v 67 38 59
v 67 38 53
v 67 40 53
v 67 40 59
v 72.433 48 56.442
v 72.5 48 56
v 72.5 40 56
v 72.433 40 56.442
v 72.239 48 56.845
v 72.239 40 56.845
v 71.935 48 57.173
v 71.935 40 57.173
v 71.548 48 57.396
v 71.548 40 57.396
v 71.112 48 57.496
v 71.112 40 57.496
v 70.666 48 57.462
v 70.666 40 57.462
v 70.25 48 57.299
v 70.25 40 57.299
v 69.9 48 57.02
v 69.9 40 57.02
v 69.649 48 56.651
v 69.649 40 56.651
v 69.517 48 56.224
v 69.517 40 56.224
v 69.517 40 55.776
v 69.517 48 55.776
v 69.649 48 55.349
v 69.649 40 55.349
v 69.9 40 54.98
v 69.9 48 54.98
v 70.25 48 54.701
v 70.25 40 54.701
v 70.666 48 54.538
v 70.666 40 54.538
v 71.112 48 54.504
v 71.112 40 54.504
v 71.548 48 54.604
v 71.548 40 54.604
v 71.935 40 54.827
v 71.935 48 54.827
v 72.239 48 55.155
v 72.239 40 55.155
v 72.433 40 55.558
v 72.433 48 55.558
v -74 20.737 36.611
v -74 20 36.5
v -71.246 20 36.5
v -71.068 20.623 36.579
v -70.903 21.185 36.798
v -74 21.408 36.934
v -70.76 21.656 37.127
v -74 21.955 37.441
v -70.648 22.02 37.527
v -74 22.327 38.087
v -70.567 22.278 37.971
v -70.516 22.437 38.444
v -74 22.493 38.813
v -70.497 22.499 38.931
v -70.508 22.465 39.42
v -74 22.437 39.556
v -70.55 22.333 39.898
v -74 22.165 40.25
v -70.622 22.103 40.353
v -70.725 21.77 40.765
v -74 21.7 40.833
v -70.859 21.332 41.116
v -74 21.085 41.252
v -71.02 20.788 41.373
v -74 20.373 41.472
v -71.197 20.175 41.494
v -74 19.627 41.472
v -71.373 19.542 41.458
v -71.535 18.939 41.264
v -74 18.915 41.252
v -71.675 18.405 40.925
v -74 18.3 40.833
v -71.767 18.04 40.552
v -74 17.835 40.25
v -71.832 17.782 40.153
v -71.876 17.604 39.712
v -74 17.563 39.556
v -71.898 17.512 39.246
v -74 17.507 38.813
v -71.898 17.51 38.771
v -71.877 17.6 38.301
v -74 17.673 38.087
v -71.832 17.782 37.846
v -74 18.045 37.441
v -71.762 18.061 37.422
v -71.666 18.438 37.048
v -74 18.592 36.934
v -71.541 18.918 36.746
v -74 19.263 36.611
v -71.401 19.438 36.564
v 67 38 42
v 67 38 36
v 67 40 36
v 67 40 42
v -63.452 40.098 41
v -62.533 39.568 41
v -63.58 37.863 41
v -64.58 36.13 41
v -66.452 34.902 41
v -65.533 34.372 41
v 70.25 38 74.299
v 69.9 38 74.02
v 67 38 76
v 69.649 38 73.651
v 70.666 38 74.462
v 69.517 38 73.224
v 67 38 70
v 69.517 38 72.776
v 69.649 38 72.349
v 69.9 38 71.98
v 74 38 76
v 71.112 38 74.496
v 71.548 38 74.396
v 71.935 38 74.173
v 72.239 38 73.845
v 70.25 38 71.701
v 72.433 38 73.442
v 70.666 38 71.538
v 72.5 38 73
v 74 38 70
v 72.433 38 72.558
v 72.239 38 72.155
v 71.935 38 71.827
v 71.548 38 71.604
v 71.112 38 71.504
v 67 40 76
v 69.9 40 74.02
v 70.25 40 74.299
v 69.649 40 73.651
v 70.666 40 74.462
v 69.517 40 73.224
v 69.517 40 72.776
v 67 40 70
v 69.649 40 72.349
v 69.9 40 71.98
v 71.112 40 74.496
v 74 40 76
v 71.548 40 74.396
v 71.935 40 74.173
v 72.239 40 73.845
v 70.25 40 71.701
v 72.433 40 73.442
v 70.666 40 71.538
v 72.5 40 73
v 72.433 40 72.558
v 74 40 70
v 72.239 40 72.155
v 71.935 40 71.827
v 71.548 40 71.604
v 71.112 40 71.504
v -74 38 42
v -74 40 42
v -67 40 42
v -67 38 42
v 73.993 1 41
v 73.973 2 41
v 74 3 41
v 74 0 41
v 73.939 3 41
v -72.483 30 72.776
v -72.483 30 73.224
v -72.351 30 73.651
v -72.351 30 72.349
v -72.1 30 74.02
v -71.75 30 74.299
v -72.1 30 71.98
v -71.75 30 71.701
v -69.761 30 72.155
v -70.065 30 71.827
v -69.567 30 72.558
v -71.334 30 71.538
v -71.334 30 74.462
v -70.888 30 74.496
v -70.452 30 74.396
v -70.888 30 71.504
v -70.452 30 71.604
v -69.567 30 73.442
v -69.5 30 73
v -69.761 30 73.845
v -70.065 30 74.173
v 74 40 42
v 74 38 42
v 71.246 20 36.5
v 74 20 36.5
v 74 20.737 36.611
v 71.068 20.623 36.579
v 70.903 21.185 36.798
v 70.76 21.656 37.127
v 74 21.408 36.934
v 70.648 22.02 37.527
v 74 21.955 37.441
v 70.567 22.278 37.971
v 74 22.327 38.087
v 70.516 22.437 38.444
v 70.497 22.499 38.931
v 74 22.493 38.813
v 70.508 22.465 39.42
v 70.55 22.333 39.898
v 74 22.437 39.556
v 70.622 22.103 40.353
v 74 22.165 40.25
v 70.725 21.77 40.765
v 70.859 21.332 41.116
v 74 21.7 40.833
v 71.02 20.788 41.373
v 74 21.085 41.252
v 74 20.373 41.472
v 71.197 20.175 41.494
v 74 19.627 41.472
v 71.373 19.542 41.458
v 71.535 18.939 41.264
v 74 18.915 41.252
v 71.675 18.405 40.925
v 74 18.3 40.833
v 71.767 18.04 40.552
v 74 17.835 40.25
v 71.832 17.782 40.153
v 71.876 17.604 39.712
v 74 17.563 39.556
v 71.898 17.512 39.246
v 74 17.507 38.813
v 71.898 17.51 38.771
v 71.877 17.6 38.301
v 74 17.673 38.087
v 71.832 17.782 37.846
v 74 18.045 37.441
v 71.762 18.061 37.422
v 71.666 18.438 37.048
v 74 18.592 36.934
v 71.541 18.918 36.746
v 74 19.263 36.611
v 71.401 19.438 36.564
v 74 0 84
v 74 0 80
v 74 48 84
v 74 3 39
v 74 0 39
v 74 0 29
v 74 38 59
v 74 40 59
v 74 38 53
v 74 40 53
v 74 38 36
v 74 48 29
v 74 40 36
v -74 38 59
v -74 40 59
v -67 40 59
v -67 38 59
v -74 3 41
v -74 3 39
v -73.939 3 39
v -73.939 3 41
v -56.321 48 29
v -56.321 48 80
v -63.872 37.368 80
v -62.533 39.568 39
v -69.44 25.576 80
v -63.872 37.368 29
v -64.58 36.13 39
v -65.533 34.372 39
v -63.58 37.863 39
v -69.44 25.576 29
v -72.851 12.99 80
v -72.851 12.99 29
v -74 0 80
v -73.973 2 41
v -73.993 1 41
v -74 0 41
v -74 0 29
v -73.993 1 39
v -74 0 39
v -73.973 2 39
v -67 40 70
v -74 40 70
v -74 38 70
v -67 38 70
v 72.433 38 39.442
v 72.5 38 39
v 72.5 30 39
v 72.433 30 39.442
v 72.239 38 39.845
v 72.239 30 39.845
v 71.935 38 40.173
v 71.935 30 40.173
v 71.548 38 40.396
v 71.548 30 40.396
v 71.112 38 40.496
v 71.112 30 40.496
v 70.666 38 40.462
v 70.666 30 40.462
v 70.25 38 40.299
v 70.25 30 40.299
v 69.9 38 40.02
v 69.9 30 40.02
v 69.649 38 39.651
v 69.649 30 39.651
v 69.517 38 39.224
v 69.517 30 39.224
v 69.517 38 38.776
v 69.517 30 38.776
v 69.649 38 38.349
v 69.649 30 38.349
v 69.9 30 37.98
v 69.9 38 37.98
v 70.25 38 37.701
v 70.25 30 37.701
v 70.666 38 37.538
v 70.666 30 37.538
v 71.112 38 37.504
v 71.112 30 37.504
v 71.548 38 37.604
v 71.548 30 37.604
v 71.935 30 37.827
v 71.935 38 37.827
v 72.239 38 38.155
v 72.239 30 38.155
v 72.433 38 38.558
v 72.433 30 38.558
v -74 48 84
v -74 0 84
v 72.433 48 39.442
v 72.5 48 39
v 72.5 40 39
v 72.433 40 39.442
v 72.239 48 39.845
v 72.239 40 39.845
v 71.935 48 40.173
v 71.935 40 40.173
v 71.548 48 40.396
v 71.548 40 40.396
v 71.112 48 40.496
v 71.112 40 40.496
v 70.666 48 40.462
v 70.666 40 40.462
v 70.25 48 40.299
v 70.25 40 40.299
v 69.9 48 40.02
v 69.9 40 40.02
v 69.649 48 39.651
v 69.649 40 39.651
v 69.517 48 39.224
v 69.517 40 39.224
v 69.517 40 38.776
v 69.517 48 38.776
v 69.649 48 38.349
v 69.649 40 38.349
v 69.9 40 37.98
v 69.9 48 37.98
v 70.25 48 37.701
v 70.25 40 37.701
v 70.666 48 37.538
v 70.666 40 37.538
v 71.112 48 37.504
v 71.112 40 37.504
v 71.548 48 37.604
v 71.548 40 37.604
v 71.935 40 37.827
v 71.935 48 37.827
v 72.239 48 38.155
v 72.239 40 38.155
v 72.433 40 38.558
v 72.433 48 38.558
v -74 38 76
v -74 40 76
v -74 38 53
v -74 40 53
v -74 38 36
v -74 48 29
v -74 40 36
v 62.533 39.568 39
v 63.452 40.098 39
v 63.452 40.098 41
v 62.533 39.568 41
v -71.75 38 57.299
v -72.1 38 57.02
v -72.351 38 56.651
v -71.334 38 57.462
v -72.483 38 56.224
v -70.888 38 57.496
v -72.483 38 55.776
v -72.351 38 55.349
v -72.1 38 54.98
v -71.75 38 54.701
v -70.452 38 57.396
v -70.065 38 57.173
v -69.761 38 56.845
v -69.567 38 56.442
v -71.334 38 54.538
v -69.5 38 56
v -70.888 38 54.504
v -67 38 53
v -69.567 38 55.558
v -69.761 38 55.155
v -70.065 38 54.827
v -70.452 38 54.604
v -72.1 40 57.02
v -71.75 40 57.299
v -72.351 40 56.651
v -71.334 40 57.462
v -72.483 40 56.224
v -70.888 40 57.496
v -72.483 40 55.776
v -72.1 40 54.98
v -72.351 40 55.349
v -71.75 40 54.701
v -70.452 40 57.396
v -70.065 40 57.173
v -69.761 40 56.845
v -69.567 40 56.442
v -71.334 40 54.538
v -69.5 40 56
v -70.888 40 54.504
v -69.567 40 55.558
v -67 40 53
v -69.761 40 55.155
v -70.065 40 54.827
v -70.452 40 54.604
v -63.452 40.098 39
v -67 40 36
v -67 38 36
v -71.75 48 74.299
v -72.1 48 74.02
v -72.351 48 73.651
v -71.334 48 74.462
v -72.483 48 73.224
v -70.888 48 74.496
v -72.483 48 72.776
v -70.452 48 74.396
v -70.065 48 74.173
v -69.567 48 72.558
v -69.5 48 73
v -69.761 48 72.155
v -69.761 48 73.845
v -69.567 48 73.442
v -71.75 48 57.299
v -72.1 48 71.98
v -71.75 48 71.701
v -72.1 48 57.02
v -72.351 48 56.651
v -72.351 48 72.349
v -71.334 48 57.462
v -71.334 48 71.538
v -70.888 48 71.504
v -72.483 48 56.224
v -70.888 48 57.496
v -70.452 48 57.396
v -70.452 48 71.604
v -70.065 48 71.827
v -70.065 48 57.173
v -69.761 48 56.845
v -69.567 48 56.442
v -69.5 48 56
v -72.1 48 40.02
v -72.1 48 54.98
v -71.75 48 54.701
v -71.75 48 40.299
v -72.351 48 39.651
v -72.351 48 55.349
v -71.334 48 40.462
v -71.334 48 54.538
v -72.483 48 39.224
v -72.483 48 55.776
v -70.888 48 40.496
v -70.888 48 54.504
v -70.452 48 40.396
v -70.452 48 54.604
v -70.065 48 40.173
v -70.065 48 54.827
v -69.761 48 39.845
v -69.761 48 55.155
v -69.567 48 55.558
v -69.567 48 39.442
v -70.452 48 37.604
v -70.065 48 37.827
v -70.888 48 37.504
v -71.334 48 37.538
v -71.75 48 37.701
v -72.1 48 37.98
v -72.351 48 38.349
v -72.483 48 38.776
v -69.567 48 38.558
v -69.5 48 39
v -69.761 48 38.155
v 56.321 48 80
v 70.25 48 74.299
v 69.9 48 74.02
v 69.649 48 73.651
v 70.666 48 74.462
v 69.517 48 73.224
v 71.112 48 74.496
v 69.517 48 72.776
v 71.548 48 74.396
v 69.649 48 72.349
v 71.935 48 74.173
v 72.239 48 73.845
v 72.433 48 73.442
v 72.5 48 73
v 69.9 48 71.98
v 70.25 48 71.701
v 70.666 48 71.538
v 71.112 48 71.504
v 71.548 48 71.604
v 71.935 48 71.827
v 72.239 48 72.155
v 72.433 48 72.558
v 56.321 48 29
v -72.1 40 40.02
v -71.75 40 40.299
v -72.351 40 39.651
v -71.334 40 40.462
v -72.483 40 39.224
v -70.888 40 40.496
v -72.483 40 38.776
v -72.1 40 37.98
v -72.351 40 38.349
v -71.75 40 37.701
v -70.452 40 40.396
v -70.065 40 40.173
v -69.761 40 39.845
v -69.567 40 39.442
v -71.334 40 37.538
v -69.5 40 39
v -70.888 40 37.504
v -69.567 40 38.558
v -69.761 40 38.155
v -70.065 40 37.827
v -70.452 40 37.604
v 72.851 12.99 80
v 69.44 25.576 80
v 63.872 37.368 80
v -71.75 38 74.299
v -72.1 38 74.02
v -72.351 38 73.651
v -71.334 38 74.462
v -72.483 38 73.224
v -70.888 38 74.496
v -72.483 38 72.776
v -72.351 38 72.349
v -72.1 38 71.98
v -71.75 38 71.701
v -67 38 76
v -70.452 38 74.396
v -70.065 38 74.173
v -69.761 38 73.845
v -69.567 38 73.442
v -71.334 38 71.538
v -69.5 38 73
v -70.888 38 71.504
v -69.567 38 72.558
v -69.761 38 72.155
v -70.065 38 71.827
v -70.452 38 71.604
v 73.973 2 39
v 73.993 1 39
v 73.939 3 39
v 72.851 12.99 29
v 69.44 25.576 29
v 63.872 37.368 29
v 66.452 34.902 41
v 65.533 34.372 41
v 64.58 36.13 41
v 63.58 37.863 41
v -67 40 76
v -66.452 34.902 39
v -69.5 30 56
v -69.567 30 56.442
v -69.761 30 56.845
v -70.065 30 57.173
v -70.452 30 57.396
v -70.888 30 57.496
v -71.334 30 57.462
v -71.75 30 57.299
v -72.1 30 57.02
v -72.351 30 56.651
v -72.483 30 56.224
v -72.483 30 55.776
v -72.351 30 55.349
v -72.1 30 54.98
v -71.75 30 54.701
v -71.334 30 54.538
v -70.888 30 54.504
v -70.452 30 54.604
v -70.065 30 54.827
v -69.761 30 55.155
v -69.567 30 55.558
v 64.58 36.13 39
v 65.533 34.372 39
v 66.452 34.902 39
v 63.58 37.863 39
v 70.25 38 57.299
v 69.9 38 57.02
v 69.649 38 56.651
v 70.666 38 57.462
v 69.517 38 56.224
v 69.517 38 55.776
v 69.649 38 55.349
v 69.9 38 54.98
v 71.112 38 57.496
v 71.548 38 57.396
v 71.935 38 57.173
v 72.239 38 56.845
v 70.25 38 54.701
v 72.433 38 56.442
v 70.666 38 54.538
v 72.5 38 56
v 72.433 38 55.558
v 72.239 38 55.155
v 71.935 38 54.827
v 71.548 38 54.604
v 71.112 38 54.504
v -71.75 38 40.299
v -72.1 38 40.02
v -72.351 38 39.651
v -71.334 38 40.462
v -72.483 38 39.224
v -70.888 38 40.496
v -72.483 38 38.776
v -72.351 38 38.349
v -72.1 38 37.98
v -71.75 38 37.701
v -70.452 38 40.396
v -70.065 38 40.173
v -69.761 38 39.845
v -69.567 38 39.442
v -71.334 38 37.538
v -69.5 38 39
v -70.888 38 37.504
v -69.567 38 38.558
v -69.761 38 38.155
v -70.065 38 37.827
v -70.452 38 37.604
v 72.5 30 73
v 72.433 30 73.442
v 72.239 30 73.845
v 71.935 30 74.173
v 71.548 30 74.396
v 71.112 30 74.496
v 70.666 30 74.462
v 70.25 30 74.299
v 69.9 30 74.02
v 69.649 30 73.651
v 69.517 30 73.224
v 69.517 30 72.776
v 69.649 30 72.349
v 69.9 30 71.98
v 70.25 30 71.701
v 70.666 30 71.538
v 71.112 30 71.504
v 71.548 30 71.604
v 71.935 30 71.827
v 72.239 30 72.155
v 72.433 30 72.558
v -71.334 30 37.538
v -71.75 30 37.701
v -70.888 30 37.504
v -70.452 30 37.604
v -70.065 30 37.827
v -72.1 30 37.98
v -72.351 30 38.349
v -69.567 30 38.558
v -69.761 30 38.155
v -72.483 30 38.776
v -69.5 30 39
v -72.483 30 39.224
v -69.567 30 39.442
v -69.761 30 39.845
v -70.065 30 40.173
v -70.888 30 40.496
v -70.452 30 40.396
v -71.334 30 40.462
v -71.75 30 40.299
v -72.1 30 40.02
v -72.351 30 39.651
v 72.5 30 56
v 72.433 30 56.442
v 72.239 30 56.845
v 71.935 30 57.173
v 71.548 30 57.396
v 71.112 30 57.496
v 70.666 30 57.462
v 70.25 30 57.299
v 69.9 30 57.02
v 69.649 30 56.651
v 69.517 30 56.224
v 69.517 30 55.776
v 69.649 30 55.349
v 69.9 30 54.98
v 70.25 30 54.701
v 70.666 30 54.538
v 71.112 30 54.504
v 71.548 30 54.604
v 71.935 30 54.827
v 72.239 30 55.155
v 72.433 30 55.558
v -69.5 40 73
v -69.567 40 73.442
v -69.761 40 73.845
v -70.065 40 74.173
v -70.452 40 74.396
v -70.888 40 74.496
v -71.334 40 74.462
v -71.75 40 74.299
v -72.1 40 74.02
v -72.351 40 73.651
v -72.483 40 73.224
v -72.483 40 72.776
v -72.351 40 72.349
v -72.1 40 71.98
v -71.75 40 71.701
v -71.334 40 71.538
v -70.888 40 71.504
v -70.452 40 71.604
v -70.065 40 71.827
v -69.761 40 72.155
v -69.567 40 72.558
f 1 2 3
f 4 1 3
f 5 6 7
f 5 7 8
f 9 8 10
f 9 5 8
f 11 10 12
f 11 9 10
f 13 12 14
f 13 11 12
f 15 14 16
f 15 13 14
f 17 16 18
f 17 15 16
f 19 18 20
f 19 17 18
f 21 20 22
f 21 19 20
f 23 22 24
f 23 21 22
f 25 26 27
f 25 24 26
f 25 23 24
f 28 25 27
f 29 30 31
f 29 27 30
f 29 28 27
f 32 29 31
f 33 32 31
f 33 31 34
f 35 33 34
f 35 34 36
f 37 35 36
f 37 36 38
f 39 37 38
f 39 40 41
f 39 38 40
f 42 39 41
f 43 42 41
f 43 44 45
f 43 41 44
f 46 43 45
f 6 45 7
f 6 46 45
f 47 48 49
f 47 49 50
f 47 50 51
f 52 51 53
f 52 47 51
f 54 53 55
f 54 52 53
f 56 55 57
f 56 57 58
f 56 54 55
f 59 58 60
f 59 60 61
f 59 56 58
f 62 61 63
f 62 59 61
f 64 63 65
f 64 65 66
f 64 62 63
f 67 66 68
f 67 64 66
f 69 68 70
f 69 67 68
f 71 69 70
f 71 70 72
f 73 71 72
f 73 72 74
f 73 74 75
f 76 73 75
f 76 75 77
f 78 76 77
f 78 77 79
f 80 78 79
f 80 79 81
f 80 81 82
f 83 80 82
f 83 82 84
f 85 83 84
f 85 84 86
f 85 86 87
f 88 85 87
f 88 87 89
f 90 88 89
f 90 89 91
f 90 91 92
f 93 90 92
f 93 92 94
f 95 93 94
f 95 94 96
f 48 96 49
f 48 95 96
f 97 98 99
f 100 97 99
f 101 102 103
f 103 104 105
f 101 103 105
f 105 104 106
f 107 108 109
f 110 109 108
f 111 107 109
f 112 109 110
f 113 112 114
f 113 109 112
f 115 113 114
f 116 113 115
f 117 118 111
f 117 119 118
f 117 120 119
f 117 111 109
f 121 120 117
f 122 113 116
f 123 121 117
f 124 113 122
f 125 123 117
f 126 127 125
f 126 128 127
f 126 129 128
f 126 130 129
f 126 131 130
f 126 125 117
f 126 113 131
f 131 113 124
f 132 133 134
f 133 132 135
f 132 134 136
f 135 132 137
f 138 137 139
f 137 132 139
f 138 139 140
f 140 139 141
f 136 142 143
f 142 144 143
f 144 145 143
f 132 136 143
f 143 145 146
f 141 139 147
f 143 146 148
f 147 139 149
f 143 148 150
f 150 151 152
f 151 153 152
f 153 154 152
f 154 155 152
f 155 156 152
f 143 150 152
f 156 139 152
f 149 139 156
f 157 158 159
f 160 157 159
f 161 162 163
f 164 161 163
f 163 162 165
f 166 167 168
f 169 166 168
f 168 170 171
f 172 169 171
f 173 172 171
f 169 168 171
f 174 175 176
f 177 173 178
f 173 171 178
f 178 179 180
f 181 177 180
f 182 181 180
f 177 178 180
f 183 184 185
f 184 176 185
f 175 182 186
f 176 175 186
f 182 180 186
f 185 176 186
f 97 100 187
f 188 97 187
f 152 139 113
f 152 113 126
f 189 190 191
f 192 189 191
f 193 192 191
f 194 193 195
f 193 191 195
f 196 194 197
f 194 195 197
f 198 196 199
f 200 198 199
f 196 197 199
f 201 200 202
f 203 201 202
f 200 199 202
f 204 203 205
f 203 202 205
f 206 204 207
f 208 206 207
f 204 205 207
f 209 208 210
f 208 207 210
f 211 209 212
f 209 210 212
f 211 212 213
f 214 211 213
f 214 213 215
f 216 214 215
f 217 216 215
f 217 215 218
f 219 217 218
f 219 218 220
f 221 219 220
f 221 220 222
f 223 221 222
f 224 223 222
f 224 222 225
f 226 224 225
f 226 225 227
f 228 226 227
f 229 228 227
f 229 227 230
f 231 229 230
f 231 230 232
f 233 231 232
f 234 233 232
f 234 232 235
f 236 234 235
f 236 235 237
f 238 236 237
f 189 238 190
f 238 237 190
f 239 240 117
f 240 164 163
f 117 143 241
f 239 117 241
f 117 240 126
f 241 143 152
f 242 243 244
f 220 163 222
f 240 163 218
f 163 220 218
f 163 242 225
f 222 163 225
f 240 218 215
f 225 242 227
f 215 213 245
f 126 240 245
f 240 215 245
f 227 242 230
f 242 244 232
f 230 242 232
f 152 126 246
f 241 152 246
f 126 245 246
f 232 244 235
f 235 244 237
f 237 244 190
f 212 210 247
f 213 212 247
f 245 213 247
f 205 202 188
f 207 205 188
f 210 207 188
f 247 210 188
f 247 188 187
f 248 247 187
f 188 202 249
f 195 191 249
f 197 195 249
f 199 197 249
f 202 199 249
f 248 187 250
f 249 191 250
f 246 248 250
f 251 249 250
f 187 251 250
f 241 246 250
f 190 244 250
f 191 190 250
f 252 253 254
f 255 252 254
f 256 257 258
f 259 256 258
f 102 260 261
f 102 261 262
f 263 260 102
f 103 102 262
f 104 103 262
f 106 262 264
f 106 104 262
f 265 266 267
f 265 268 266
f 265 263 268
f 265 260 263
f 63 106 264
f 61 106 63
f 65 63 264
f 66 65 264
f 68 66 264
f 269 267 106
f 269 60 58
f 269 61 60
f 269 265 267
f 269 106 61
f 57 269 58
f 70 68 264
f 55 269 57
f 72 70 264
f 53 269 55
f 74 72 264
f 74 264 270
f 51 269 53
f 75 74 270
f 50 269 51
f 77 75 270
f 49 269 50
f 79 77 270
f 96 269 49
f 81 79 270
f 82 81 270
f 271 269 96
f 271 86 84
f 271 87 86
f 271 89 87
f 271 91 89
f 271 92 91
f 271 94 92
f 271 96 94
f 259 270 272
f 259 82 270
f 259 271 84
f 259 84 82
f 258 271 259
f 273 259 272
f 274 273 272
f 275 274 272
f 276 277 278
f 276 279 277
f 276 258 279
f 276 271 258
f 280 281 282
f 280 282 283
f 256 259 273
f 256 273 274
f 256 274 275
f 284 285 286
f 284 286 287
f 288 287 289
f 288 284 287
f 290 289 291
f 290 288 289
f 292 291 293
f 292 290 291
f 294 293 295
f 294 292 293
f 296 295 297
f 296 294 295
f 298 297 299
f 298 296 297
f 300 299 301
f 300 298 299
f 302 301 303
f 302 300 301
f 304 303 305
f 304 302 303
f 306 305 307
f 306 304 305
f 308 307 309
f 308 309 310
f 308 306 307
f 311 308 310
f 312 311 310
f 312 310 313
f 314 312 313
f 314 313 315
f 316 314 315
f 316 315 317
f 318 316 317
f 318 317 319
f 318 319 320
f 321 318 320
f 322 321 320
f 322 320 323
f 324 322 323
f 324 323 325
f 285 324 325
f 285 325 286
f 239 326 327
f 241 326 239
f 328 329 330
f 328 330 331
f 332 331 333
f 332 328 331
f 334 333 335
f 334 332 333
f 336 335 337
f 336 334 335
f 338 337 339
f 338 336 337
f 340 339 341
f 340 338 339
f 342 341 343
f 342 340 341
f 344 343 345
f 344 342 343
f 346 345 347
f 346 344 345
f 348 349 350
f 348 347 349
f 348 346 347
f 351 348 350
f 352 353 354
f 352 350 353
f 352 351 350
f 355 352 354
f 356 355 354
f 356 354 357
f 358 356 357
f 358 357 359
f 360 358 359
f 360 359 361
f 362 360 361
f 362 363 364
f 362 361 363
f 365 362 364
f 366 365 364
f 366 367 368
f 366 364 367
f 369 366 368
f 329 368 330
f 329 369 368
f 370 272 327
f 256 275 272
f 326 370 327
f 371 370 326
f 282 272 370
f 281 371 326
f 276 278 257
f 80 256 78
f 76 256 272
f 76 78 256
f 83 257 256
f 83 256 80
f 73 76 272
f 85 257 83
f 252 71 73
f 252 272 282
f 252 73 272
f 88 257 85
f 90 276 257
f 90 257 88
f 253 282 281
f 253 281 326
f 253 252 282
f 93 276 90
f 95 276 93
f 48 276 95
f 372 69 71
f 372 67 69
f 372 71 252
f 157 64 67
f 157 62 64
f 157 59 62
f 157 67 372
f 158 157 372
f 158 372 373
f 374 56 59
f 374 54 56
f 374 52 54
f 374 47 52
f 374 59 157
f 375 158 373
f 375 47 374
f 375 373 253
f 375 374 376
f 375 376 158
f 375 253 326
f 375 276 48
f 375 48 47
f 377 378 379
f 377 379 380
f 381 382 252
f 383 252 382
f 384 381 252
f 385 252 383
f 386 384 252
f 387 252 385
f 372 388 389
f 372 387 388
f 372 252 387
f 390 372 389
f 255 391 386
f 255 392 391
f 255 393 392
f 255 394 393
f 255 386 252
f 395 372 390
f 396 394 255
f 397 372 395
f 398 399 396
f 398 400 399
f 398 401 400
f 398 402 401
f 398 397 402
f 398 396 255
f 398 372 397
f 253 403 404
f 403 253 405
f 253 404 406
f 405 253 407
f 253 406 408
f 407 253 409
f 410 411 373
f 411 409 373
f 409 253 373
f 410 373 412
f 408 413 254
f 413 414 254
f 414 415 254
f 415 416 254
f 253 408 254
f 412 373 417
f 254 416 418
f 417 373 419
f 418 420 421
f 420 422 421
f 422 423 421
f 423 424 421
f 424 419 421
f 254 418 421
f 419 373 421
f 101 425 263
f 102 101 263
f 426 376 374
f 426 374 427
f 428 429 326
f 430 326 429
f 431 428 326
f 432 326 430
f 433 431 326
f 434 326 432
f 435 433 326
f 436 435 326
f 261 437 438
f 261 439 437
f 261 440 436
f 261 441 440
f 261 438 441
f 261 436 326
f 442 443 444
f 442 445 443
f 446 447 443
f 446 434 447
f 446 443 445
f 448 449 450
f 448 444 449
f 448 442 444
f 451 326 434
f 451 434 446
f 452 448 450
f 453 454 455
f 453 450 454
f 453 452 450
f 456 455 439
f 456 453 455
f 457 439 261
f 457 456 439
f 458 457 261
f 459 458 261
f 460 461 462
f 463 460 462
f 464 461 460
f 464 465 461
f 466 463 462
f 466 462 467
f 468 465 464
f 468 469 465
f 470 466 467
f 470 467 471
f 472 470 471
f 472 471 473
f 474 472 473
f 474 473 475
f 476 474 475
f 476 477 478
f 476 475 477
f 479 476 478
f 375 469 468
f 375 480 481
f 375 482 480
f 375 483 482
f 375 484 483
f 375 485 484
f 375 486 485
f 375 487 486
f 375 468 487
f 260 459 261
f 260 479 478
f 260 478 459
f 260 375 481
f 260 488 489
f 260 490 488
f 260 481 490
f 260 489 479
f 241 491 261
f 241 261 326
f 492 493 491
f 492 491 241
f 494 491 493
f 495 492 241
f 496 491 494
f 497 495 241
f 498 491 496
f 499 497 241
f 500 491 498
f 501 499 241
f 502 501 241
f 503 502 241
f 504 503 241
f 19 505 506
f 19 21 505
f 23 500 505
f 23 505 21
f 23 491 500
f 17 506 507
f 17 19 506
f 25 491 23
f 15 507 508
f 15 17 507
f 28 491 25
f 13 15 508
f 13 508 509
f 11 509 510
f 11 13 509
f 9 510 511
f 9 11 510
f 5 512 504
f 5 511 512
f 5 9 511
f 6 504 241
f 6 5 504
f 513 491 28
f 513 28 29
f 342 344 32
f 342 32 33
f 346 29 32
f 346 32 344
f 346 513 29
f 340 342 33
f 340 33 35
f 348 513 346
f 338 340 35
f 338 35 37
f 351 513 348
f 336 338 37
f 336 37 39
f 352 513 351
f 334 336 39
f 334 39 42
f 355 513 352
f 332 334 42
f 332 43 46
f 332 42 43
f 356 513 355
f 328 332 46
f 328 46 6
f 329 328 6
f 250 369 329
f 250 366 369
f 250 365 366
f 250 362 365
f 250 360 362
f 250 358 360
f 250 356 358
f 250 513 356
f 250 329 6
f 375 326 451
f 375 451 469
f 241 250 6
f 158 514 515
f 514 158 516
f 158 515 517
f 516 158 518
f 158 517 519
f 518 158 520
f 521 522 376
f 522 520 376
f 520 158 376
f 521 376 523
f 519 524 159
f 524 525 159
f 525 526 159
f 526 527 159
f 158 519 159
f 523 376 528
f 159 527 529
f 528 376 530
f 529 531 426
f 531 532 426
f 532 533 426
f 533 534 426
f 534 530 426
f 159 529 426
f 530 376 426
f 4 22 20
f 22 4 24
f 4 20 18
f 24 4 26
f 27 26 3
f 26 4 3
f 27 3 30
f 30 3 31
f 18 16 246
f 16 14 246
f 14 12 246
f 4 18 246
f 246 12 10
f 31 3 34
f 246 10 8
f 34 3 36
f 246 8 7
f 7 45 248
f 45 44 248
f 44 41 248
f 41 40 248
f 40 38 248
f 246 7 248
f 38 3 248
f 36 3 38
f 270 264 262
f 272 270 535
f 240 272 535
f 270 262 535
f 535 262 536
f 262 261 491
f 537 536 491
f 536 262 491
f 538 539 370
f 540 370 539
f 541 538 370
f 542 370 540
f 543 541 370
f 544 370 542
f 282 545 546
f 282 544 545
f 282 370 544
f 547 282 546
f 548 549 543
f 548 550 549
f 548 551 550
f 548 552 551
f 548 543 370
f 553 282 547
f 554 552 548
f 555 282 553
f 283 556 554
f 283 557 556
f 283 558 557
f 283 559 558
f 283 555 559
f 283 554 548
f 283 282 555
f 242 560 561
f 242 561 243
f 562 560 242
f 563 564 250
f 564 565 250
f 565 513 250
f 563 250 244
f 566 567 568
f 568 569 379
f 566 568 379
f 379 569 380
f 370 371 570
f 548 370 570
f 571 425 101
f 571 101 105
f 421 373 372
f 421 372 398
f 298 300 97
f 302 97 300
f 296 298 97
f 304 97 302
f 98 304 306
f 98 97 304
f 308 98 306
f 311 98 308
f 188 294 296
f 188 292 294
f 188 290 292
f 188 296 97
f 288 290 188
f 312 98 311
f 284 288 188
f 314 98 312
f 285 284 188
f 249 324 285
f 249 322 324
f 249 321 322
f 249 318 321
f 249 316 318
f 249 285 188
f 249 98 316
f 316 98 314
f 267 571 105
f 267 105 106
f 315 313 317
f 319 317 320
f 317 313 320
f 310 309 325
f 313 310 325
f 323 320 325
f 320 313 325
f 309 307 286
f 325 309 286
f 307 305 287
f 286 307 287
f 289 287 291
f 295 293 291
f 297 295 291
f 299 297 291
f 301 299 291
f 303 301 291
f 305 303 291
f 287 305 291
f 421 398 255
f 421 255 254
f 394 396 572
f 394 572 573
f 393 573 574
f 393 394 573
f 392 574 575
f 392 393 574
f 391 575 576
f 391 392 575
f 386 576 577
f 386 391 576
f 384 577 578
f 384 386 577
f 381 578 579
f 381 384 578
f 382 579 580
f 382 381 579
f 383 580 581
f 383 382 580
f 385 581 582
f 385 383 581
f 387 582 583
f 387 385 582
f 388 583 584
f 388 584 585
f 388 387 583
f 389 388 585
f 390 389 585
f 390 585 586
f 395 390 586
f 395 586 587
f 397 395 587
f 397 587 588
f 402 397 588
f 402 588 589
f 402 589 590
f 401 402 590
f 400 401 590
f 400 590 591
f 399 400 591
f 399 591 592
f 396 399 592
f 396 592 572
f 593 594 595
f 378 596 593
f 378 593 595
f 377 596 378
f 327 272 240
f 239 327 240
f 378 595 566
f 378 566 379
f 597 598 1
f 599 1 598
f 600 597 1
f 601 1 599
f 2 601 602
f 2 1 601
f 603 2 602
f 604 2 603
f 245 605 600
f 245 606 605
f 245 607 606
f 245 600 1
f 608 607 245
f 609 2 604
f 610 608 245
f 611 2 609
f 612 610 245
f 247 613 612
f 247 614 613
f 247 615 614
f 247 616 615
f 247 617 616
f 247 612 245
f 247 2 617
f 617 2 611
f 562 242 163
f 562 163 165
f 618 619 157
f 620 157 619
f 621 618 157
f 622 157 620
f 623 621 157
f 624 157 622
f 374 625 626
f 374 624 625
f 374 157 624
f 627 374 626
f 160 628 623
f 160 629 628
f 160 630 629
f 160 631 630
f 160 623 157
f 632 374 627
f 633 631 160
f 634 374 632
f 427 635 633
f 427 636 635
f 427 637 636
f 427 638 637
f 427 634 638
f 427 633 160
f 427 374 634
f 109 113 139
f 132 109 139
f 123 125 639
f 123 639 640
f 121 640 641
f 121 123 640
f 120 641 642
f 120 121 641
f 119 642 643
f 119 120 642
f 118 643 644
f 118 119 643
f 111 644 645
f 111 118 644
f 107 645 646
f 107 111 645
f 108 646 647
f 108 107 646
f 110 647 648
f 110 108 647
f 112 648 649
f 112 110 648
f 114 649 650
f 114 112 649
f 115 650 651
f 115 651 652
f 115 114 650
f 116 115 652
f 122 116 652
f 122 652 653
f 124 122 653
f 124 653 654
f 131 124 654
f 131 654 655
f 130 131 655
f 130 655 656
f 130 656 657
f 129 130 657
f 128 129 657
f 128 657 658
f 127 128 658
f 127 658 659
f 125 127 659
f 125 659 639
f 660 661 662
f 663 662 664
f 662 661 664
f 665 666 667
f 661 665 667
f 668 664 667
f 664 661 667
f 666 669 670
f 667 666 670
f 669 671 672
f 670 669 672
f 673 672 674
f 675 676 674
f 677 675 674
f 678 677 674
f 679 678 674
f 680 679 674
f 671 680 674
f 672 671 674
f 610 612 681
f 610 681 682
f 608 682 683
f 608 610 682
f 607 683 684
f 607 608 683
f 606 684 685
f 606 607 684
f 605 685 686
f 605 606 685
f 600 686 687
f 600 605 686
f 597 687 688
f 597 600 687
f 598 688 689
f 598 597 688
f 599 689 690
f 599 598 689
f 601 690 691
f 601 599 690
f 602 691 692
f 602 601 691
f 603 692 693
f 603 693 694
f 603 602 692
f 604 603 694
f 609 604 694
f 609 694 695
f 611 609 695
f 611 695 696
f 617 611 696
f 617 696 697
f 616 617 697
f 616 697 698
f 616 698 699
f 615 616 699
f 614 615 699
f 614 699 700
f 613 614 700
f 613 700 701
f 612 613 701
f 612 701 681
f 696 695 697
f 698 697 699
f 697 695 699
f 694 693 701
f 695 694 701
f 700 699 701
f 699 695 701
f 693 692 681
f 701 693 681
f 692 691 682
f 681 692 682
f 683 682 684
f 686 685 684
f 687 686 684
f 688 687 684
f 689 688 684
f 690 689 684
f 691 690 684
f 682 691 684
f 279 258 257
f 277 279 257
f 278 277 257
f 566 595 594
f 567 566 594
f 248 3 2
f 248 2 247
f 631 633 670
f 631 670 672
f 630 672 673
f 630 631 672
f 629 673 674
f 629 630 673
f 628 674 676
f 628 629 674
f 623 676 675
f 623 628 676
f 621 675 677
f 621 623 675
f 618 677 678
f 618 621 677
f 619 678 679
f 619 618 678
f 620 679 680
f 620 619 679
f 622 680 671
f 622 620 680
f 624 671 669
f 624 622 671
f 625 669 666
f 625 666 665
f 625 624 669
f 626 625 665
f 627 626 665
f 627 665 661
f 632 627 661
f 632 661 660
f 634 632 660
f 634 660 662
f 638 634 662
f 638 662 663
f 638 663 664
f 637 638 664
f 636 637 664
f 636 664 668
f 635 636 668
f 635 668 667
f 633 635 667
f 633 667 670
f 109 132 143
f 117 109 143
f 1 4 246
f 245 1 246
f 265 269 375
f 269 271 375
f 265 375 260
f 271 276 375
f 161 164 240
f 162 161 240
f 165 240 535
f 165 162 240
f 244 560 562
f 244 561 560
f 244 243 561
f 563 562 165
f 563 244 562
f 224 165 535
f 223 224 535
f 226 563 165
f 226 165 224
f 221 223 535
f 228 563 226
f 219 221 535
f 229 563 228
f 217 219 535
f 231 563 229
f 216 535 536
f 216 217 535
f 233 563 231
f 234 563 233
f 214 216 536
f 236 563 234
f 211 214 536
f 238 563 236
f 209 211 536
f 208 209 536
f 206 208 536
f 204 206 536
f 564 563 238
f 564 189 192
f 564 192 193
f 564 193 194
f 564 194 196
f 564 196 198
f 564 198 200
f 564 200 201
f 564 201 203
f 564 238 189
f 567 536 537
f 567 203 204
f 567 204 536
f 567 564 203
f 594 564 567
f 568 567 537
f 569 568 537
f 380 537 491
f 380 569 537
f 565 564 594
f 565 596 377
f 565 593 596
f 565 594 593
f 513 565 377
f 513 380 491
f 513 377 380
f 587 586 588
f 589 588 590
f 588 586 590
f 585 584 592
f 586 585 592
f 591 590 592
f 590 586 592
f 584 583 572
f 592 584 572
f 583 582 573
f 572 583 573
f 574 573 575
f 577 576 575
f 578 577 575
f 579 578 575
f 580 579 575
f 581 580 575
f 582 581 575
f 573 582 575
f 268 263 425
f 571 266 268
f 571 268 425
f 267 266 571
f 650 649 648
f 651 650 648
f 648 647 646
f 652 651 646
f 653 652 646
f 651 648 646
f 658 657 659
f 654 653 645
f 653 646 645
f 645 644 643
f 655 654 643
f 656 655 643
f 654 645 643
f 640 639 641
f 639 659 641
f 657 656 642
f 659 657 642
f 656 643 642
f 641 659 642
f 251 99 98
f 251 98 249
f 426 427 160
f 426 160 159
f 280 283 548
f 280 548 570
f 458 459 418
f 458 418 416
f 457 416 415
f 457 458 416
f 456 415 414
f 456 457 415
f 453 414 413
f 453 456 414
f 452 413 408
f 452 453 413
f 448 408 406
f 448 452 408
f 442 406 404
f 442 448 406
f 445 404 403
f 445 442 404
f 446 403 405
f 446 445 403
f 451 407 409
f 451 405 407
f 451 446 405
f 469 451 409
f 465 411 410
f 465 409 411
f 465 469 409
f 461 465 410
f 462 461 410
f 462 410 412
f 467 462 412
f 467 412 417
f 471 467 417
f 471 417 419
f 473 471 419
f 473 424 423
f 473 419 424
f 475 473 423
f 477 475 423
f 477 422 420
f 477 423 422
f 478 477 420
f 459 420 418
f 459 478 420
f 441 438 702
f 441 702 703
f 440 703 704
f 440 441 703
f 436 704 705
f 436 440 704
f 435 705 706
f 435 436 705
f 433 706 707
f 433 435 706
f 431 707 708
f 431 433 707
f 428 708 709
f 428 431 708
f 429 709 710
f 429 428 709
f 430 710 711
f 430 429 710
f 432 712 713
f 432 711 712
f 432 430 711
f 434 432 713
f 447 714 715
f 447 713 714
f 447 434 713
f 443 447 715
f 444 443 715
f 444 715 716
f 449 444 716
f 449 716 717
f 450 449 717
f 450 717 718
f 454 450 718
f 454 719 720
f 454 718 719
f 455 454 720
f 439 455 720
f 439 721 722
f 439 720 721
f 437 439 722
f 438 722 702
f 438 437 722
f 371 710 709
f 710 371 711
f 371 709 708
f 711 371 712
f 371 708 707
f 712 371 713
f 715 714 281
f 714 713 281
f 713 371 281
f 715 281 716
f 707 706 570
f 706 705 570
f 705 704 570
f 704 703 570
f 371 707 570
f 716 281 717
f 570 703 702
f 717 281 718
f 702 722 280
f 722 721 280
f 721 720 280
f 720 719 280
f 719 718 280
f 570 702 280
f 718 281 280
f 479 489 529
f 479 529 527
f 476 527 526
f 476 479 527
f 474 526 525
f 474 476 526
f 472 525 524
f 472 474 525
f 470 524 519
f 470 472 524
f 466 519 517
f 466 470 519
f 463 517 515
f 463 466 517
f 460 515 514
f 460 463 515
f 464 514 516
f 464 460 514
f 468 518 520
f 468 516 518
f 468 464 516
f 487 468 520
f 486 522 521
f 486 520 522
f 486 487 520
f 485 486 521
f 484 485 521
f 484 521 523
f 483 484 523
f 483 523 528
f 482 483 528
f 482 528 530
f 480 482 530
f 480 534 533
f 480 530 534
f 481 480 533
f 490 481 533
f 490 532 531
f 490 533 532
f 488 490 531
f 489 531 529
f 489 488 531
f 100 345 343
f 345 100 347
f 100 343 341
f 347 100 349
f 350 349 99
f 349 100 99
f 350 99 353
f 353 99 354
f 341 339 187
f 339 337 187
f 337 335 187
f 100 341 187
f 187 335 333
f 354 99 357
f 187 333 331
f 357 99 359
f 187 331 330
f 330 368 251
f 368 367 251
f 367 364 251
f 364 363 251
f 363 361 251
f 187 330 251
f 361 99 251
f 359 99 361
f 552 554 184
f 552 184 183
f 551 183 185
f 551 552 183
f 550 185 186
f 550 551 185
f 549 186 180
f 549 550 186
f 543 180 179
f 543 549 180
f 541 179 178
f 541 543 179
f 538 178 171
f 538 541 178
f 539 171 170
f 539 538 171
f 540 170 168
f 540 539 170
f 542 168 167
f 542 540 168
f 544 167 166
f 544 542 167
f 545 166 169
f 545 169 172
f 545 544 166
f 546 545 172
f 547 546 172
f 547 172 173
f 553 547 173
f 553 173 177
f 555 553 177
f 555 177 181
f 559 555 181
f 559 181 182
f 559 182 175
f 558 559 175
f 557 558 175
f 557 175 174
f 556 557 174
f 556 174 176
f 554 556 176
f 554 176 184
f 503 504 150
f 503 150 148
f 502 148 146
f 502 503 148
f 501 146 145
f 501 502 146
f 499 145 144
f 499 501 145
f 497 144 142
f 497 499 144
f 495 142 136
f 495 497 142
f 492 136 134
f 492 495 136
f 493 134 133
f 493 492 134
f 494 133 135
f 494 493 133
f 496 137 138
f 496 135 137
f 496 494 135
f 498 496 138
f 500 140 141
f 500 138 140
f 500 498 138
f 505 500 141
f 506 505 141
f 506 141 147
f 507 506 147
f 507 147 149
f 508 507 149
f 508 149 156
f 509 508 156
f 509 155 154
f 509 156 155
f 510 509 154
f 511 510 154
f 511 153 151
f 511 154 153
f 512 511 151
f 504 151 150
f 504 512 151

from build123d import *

# Parameters (mm, degrees)
CYLINDER1844_R              = 2.5
CYLINDER1844_DEPTH          = 40
CYLINDER1841_R              = 2.5
CYLINDER1841_DEPTH          = 40
COMPOUND950_PLACEMENT_ANGLE = 90
CYLINDER1843_R              = 2.5
CYLINDER1843_DEPTH          = 40
CYLINDER1845_R              = 2.5
CYLINDER1845_DEPTH          = 40
COMPOUND949_PLACEMENT_ANGLE = 90
CYLINDER1842_R              = 2.5
CYLINDER1842_DEPTH          = 40
CYLINDER1850_R              = 2.5
CYLINDER1850_DEPTH          = 40
CYLINDER1851_R              = 2.5
CYLINDER1851_DEPTH          = 40
CYLINDER1848_R              = 2.5
CYLINDER1848_DEPTH          = 40
CYLINDER1846_R              = 2.5
CYLINDER1846_DEPTH          = 40
CYLINDER1847_R              = 2.5
CYLINDER1847_DEPTH          = 40
BOX851_W                    = 6
BOX851_H                    = 8
BOX851_DEPTH                = 2
BOX851_PLACEMENT_ANGLE      = 30
BOX852_W                    = 6
BOX852_H                    = 8
BOX852_DEPTH                = 2
BOX852_PLACEMENT_ANGLE      = 60
BOX853_W                    = 6
BOX853_H                    = 8
BOX853_DEPTH                = 2
BOX854_W                    = 6
BOX854_H                    = 8
BOX854_DEPTH                = 2
BOX854_PLACEMENT_ANGLE      = 120
BOX855_W                    = 6
BOX855_H                    = 8
BOX855_DEPTH                = 2
BOX855_PLACEMENT_ANGLE      = 150
BOX856_W                    = 6
BOX856_H                    = 8
BOX856_DEPTH                = 2
BOX857_W                    = 6
BOX857_H                    = 8
BOX857_DEPTH                = 2
BOX857_PLACEMENT_ANGLE      = 210
BOX858_W                    = 6
BOX858_H                    = 8
BOX858_DEPTH                = 2
BOX858_PLACEMENT_ANGLE      = 240
BOX859_W                    = 6
BOX859_H                    = 8
BOX859_DEPTH                = 2
BOX860_W                    = 6
BOX860_H                    = 8
BOX860_DEPTH                = 2
BOX860_PLACEMENT_ANGLE      = 60
BOX861_W                    = 6
BOX861_H                    = 8
BOX861_DEPTH                = 2
BOX861_PLACEMENT_ANGLE      = 30
BOX850_W                    = 6
BOX850_H                    = 8
BOX850_DEPTH                = 2
BOX814_W                    = 8
BOX814_H                    = 2
BOX814_DEPTH                = 6
BOX825_W                    = 8
BOX825_H                    = 2
BOX825_DEPTH                = 6
BOX847_W                    = 8
BOX847_H                    = 2
BOX847_DEPTH                = 6
BOX848_W                    = 8
BOX848_H                    = 2
BOX848_DEPTH                = 6
BOX849_W                    = 8
BOX849_H                    = 2
BOX849_DEPTH                = 6
BOX816_W                    = 8
BOX816_H                    = 2
BOX816_DEPTH                = 6
CYLINDER1862_R              = 1.5
CYLINDER1862_DEPTH          = 50
CYLINDER1865_R              = 1.5
CYLINDER1865_DEPTH          = 50
CYLINDER1863_R              = 1.5
CYLINDER1863_DEPTH          = 50
CYLINDER1861_R              = 1.5
CYLINDER1861_DEPTH          = 50
CYLINDER1858_R              = 1.5
CYLINDER1858_DEPTH          = 50
CYLINDER1859_R              = 1.5
CYLINDER1859_DEPTH          = 50
BOX815_W                    = 148
BOX815_H                    = 26
BOX815_DEPTH                = 55
CYLINDER1860_R              = 74
CYLINDER1860_DEPTH          = 51
BOX817_W                    = 148
BOX817_H                    = 74
BOX817_DEPTH                = 55


with BuildPart() as v_lec1844:
    # Cylinder1844 → Cylinder1844 (new body)
    with BuildSketch(Plane(origin=(-86, -10, 69), x_dir=(0, 0, -1), z_dir=(1, 0, 0))):
        Circle(CYLINDER1844_R)
    extrude(amount=CYLINDER1844_DEPTH)


with BuildPart() as compound950:
    # Cylinder1841 → Cylinder1841 (new body)
    with BuildSketch(Plane(origin=(-86, -10, 39), x_dir=(0, 0, -1), z_dir=(1, 0, 0))):
        Circle(CYLINDER1841_R)
    extrude(amount=CYLINDER1841_DEPTH)

    # Compound950: union Válec1844
    add(v_lec1844.part)


with BuildPart() as compound950_1:
    # Compound950 placement: moved
    add(compound950.part.moved(Location((-21.5, 0, 0))).rotate(Axis((-21.5, 0, 0), (0, 0, 1)), COMPOUND950_PLACEMENT_ANGLE))


with BuildPart() as v_lec1843:
    # Cylinder1843 → Cylinder1843 (new body)
    with BuildSketch(Plane(origin=(-86, -10, 69), x_dir=(0, 0, -1), z_dir=(1, 0, 0))):
        Circle(CYLINDER1843_R)
    extrude(amount=CYLINDER1843_DEPTH)


with BuildPart() as compound975:
    # Cylinder1845 → Cylinder1845 (new body)
    with BuildSketch(Plane(origin=(-86, -10, 39), x_dir=(0, 0, -1), z_dir=(1, 0, 0))):
        Circle(CYLINDER1845_R)
    extrude(amount=CYLINDER1845_DEPTH)

    # Compound949: union Válec1843
    add(v_lec1843.part)


with BuildPart() as compound975_1:
    # Compound949 placement: moved
    add(compound975.part.moved(Location((1.5, 0, 0))).rotate(Axis((1.5, 0, 0), (0, 0, 1)), COMPOUND949_PLACEMENT_ANGLE))

    # Compound975: union Compound950
    add(compound950_1.part)


with BuildPart() as v_lec1842:
    # Cylinder1842 → Cylinder1842 (new body)
    with BuildSketch(Plane(origin=(-86, 20, 39), x_dir=(0, 0, -1), z_dir=(1, 0, 0))):
        Circle(CYLINDER1842_R)
    extrude(amount=CYLINDER1842_DEPTH)


with BuildPart() as v_lec1850:
    # Cylinder1850 → Cylinder1850 (new body)
    with BuildSketch(Plane(origin=(-86, -10, 69), x_dir=(0, 0, -1), z_dir=(1, 0, 0))):
        Circle(CYLINDER1850_R)
    extrude(amount=CYLINDER1850_DEPTH)


with BuildPart() as compound974:
    # Cylinder1851 → Cylinder1851 (new body)
    with BuildSketch(Plane(origin=(-86, -10, 39), x_dir=(0, 0, -1), z_dir=(1, 0, 0))):
        Circle(CYLINDER1851_R)
    extrude(amount=CYLINDER1851_DEPTH)

    # Compound974: union Válec1842, Válec1850
    add(v_lec1842.part)
    add(v_lec1850.part)


with BuildPart() as mirror008:
    # mirror008: instance of Compound974
    add(compound974.part.mirror(Plane(origin=(0, 0, 0), x_dir=(0, -1, 0), z_dir=(1, 0, 0))))


with BuildPart() as v_lec1848:
    # Cylinder1848 → Cylinder1848 (new body)
    with BuildSketch(Plane(origin=(-86, 20, 39), x_dir=(0, 0, -1), z_dir=(1, 0, 0))):
        Circle(CYLINDER1848_R)
    extrude(amount=CYLINDER1848_DEPTH)


with BuildPart() as v_lec1846:
    # Cylinder1846 → Cylinder1846 (new body)
    with BuildSketch(Plane(origin=(-86, -10, 69), x_dir=(0, 0, -1), z_dir=(1, 0, 0))):
        Circle(CYLINDER1846_R)
    extrude(amount=CYLINDER1846_DEPTH)


with BuildPart() as compound948:
    # Cylinder1847 → Cylinder1847 (new body)
    with BuildSketch(Plane(origin=(-86, -10, 39), x_dir=(0, 0, -1), z_dir=(1, 0, 0))):
        Circle(CYLINDER1847_R)
    extrude(amount=CYLINDER1847_DEPTH)

    # Compound947: union Válec1848, Válec1846
    add(v_lec1848.part)
    add(v_lec1846.part)

    # Compound948: union Compound975, mirror008
    add(compound975_1.part)
    add(mirror008.part)


with BuildPart() as krychle851:
    # Box851 → Box851 (new body)
    with BuildSketch(Plane.XY):
        with Locations((3, 4)):
            Rectangle(BOX851_W, BOX851_H)
    extrude(amount=BOX851_DEPTH)


with BuildPart() as krychle851_1:
    # Box851 placement: moved
    add(krychle851.part.moved(Location((34.901924, -66.451905, 39))).rotate(Axis((34.901924, -66.451905, 39), (0, 0, 1)), BOX851_PLACEMENT_ANGLE))


with BuildPart() as krychle852:
    # Box852 → Box852 (new body)
    with BuildSketch(Plane.XY):
        with Locations((3, 4)):
            Rectangle(BOX852_W, BOX852_H)
    extrude(amount=BOX852_DEPTH)


with BuildPart() as krychle852_1:
    # Box852 placement: moved
    add(krychle852.part.moved(Location((63.451905, -40.098076, 39))).rotate(Axis((63.451905, -40.098076, 39), (0, 0, 1)), BOX852_PLACEMENT_ANGLE))


with BuildPart() as krychle853:
    # Box853 → Box853 (new body)
    with BuildSketch(Plane(origin=(75, -3, 39), x_dir=(0, 1, 0), z_dir=(0, 0, 1))):
        with Locations((3, 4)):
            Rectangle(BOX853_W, BOX853_H)
    extrude(amount=BOX853_DEPTH)


with BuildPart() as krychle854:
    # Box854 → Box854 (new body)
    with BuildSketch(Plane.XY):
        with Locations((3, 4)):
            Rectangle(BOX854_W, BOX854_H)
    extrude(amount=BOX854_DEPTH)


with BuildPart() as krychle854_1:
    # Box854 placement: moved
    add(krychle854.part.moved(Location((66.451905, 34.901924, 39))).rotate(Axis((66.451905, 34.901924, 39), (0, 0, 1)), BOX854_PLACEMENT_ANGLE))


with BuildPart() as krychle855:
    # Box855 → Box855 (new body)
    with BuildSketch(Plane.XY):
        with Locations((3, 4)):
            Rectangle(BOX855_W, BOX855_H)
    extrude(amount=BOX855_DEPTH)


with BuildPart() as krychle855_1:
    # Box855 placement: moved
    add(krychle855.part.moved(Location((40.098076, 63.451905, 39))).rotate(Axis((40.098076, 63.451905, 39), (0, 0, 1)), BOX855_PLACEMENT_ANGLE))


with BuildPart() as krychle856:
    # Box856 → Box856 (new body)
    with BuildSketch(Plane(origin=(3, 75, 39), x_dir=(-1, 0, 0), z_dir=(0, 0, 1))):
        with Locations((3, 4)):
            Rectangle(BOX856_W, BOX856_H)
    extrude(amount=BOX856_DEPTH)


with BuildPart() as krychle857:
    # Box857 → Box857 (new body)
    with BuildSketch(Plane.XY):
        with Locations((3, 4)):
            Rectangle(BOX857_W, BOX857_H)
    extrude(amount=BOX857_DEPTH)


with BuildPart() as krychle857_1:
    # Box857 placement: moved
    add(krychle857.part.moved(Location((-34.901924, 66.451905, 39))).rotate(Axis((-34.901924, 66.451905, 39), (0, 0, 1)), BOX857_PLACEMENT_ANGLE))


with BuildPart() as krychle858:
    # Box858 → Box858 (new body)
    with BuildSketch(Plane.XY):
        with Locations((3, 4)):
            Rectangle(BOX858_W, BOX858_H)
    extrude(amount=BOX858_DEPTH)


with BuildPart() as krychle858_1:
    # Box858 placement: moved
    add(krychle858.part.moved(Location((-63.451905, 40.098076, 39))).rotate(Axis((-63.451905, 40.098076, 39), (0, 0, 1)), BOX858_PLACEMENT_ANGLE))


with BuildPart() as krychle859:
    # Box859 → Box859 (new body)
    with BuildSketch(Plane(origin=(-75, 3, 39), x_dir=(0, -1, 0), z_dir=(0, 0, 1))):
        with Locations((3, 4)):
            Rectangle(BOX859_W, BOX859_H)
    extrude(amount=BOX859_DEPTH)


with BuildPart() as krychle860:
    # Box860 → Box860 (new body)
    with BuildSketch(Plane.XY):
        with Locations((3, 4)):
            Rectangle(BOX860_W, BOX860_H)
    extrude(amount=BOX860_DEPTH)


with BuildPart() as krychle860_1:
    # Box860 placement: moved
    add(krychle860.part.moved(Location((-66.451905, -34.901924, 39))).rotate(Axis((-66.451905, -34.901924, 39), (0, 0, -1)), BOX860_PLACEMENT_ANGLE))


with BuildPart() as krychle861:
    # Box861 → Box861 (new body)
    with BuildSketch(Plane.XY):
        with Locations((3, 4)):
            Rectangle(BOX861_W, BOX861_H)
    extrude(amount=BOX861_DEPTH)


with BuildPart() as krychle861_1:
    # Box861 placement: moved
    add(krychle861.part.moved(Location((-40.098076, -63.451905, 39))).rotate(Axis((-40.098076, -63.451905, 39), (0, 0, -1)), BOX861_PLACEMENT_ANGLE))


with BuildPart() as compound968:
    # Box850 → Box850 (new body)
    with BuildSketch(Plane(origin=(-3, -75, 39), x_dir=(1, 0, 0), z_dir=(0, 0, 1))):
        with Locations((3, 4)):
            Rectangle(BOX850_W, BOX850_H)
    extrude(amount=BOX850_DEPTH)

    # Compound968: union Krychle851, Krychle852, Krychle853, Krychle854, Krychle855, Krychle856, Krychle857, Krychle858, Krychle859, Krychle860, Krychle861
    add(krychle851_1.part)
    add(krychle852_1.part)
    add(krychle853.part)
    add(krychle854_1.part)
    add(krychle855_1.part)
    add(krychle856.part)
    add(krychle857_1.part)
    add(krychle858_1.part)
    add(krychle859.part)
    add(krychle860_1.part)
    add(krychle861_1.part)


with BuildPart() as krychle814:
    # Box814 → Box814 (new body)
    with BuildSketch(Plane(origin=(67, 38, 36), x_dir=(1, 0, 0), z_dir=(0, 0, 1))):
        with Locations((4, 1)):
            Rectangle(BOX814_W, BOX814_H)
    extrude(amount=BOX814_DEPTH)


with BuildPart() as krychle825:
    # Box825 → Box825 (new body)
    with BuildSketch(Plane(origin=(67, 38, 70), x_dir=(1, 0, 0), z_dir=(0, 0, 1))):
        with Locations((4, 1)):
            Rectangle(BOX825_W, BOX825_H)
    extrude(amount=BOX825_DEPTH)


with BuildPart() as krychle847:
    # Box847 → Box847 (new body)
    with BuildSketch(Plane(origin=(-75, 38, 70), x_dir=(1, 0, 0), z_dir=(0, 0, 1))):
        with Locations((4, 1)):
            Rectangle(BOX847_W, BOX847_H)
    extrude(amount=BOX847_DEPTH)


with BuildPart() as krychle848:
    # Box848 → Box848 (new body)
    with BuildSketch(Plane(origin=(-75, 38, 53), x_dir=(1, 0, 0), z_dir=(0, 0, 1))):
        with Locations((4, 1)):
            Rectangle(BOX848_W, BOX848_H)
    extrude(amount=BOX848_DEPTH)


with BuildPart() as krychle849:
    # Box849 → Box849 (new body)
    with BuildSketch(Plane(origin=(67, 38, 53), x_dir=(1, 0, 0), z_dir=(0, 0, 1))):
        with Locations((4, 1)):
            Rectangle(BOX849_W, BOX849_H)
    extrude(amount=BOX849_DEPTH)


with BuildPart() as compound970:
    # Box816 → Box816 (new body)
    with BuildSketch(Plane(origin=(-75, 38, 36), x_dir=(1, 0, 0), z_dir=(0, 0, 1))):
        with Locations((4, 1)):
            Rectangle(BOX816_W, BOX816_H)
    extrude(amount=BOX816_DEPTH)

    # Compound970: union Krychle814, Krychle825, Krychle847, Krychle848, Krychle849
    add(krychle814.part)
    add(krychle825.part)
    add(krychle847.part)
    add(krychle848.part)
    add(krychle849.part)


with BuildPart() as v_lec1862:
    # Cylinder1862 → Cylinder1862 (new body)
    with BuildSketch(Plane(origin=(71, 80, 39), x_dir=(1, 0, 0), z_dir=(0, -1, 0))):
        Circle(CYLINDER1862_R)
    extrude(amount=CYLINDER1862_DEPTH)


with BuildPart() as v_lec1865:
    # Cylinder1865 → Cylinder1865 (new body)
    with BuildSketch(Plane(origin=(-71, 80, 39), x_dir=(1, 0, 0), z_dir=(0, -1, 0))):
        Circle(CYLINDER1865_R)
    extrude(amount=CYLINDER1865_DEPTH)


with BuildPart() as v_lec1863:
    # Cylinder1863 → Cylinder1863 (new body)
    with BuildSketch(Plane(origin=(71, 80, 73), x_dir=(1, 0, 0), z_dir=(0, -1, 0))):
        Circle(CYLINDER1863_R)
    extrude(amount=CYLINDER1863_DEPTH)


with BuildPart() as v_lec1861:
    # Cylinder1861 → Cylinder1861 (new body)
    with BuildSketch(Plane(origin=(-71, 80, 56), x_dir=(1, 0, 0), z_dir=(0, -1, 0))):
        Circle(CYLINDER1861_R)
    extrude(amount=CYLINDER1861_DEPTH)


with BuildPart() as v_lec1858:
    # Cylinder1858 → Cylinder1858 (new body)
    with BuildSketch(Plane(origin=(71, 80, 56), x_dir=(1, 0, 0), z_dir=(0, -1, 0))):
        Circle(CYLINDER1858_R)
    extrude(amount=CYLINDER1858_DEPTH)


with BuildPart() as compound969:
    # Cylinder1859 → Cylinder1859 (new body)
    with BuildSketch(Plane(origin=(-71, 80, 73), x_dir=(1, 0, 0), z_dir=(0, -1, 0))):
        Circle(CYLINDER1859_R)
    extrude(amount=CYLINDER1859_DEPTH)

    # Compound969: union Válec1862, Válec1865, Válec1863, Válec1861, Válec1858
    add(v_lec1862.part)
    add(v_lec1865.part)
    add(v_lec1863.part)
    add(v_lec1861.part)
    add(v_lec1858.part)


with BuildPart() as krychle815:
    # Box815 → Box815 (new body)
    with BuildSketch(Plane(origin=(-74, 48, 29), x_dir=(1, 0, 0), z_dir=(0, 0, 1))):
        with Locations((74, 13)):
            Rectangle(BOX815_W, BOX815_H)
    extrude(amount=BOX815_DEPTH)


with BuildPart() as v_lec1860:
    # Cylinder1860 → Cylinder1860 (new body)
    with BuildSketch(Plane.XY.offset(29)):
        Circle(CYLINDER1860_R)
    extrude(amount=CYLINDER1860_DEPTH)


with BuildPart() as cut600:
    # Box817 → Box817 (new body)
    with BuildSketch(Plane(origin=(-74, 0, 29), x_dir=(1, 0, 0), z_dir=(0, 0, 1))):
        with Locations((74, 37)):
            Rectangle(BOX817_W, BOX817_H)
    extrude(amount=BOX817_DEPTH)

    # Cut615: cut Válec1860
    add(v_lec1860.part, mode=Mode.SUBTRACT)

    # Cut616: cut Krychle815
    add(krychle815.part, mode=Mode.SUBTRACT)

    # Cut617: cut Compound969
    add(compound969.part, mode=Mode.SUBTRACT)

    # Cut618: cut Compound970
    add(compound970.part, mode=Mode.SUBTRACT)

    # Cut598: cut Compound968
    add(compound968.part, mode=Mode.SUBTRACT)

    # Cut600: cut Compound948
    add(compound948.part, mode=Mode.SUBTRACT)


solid = cut600.part
